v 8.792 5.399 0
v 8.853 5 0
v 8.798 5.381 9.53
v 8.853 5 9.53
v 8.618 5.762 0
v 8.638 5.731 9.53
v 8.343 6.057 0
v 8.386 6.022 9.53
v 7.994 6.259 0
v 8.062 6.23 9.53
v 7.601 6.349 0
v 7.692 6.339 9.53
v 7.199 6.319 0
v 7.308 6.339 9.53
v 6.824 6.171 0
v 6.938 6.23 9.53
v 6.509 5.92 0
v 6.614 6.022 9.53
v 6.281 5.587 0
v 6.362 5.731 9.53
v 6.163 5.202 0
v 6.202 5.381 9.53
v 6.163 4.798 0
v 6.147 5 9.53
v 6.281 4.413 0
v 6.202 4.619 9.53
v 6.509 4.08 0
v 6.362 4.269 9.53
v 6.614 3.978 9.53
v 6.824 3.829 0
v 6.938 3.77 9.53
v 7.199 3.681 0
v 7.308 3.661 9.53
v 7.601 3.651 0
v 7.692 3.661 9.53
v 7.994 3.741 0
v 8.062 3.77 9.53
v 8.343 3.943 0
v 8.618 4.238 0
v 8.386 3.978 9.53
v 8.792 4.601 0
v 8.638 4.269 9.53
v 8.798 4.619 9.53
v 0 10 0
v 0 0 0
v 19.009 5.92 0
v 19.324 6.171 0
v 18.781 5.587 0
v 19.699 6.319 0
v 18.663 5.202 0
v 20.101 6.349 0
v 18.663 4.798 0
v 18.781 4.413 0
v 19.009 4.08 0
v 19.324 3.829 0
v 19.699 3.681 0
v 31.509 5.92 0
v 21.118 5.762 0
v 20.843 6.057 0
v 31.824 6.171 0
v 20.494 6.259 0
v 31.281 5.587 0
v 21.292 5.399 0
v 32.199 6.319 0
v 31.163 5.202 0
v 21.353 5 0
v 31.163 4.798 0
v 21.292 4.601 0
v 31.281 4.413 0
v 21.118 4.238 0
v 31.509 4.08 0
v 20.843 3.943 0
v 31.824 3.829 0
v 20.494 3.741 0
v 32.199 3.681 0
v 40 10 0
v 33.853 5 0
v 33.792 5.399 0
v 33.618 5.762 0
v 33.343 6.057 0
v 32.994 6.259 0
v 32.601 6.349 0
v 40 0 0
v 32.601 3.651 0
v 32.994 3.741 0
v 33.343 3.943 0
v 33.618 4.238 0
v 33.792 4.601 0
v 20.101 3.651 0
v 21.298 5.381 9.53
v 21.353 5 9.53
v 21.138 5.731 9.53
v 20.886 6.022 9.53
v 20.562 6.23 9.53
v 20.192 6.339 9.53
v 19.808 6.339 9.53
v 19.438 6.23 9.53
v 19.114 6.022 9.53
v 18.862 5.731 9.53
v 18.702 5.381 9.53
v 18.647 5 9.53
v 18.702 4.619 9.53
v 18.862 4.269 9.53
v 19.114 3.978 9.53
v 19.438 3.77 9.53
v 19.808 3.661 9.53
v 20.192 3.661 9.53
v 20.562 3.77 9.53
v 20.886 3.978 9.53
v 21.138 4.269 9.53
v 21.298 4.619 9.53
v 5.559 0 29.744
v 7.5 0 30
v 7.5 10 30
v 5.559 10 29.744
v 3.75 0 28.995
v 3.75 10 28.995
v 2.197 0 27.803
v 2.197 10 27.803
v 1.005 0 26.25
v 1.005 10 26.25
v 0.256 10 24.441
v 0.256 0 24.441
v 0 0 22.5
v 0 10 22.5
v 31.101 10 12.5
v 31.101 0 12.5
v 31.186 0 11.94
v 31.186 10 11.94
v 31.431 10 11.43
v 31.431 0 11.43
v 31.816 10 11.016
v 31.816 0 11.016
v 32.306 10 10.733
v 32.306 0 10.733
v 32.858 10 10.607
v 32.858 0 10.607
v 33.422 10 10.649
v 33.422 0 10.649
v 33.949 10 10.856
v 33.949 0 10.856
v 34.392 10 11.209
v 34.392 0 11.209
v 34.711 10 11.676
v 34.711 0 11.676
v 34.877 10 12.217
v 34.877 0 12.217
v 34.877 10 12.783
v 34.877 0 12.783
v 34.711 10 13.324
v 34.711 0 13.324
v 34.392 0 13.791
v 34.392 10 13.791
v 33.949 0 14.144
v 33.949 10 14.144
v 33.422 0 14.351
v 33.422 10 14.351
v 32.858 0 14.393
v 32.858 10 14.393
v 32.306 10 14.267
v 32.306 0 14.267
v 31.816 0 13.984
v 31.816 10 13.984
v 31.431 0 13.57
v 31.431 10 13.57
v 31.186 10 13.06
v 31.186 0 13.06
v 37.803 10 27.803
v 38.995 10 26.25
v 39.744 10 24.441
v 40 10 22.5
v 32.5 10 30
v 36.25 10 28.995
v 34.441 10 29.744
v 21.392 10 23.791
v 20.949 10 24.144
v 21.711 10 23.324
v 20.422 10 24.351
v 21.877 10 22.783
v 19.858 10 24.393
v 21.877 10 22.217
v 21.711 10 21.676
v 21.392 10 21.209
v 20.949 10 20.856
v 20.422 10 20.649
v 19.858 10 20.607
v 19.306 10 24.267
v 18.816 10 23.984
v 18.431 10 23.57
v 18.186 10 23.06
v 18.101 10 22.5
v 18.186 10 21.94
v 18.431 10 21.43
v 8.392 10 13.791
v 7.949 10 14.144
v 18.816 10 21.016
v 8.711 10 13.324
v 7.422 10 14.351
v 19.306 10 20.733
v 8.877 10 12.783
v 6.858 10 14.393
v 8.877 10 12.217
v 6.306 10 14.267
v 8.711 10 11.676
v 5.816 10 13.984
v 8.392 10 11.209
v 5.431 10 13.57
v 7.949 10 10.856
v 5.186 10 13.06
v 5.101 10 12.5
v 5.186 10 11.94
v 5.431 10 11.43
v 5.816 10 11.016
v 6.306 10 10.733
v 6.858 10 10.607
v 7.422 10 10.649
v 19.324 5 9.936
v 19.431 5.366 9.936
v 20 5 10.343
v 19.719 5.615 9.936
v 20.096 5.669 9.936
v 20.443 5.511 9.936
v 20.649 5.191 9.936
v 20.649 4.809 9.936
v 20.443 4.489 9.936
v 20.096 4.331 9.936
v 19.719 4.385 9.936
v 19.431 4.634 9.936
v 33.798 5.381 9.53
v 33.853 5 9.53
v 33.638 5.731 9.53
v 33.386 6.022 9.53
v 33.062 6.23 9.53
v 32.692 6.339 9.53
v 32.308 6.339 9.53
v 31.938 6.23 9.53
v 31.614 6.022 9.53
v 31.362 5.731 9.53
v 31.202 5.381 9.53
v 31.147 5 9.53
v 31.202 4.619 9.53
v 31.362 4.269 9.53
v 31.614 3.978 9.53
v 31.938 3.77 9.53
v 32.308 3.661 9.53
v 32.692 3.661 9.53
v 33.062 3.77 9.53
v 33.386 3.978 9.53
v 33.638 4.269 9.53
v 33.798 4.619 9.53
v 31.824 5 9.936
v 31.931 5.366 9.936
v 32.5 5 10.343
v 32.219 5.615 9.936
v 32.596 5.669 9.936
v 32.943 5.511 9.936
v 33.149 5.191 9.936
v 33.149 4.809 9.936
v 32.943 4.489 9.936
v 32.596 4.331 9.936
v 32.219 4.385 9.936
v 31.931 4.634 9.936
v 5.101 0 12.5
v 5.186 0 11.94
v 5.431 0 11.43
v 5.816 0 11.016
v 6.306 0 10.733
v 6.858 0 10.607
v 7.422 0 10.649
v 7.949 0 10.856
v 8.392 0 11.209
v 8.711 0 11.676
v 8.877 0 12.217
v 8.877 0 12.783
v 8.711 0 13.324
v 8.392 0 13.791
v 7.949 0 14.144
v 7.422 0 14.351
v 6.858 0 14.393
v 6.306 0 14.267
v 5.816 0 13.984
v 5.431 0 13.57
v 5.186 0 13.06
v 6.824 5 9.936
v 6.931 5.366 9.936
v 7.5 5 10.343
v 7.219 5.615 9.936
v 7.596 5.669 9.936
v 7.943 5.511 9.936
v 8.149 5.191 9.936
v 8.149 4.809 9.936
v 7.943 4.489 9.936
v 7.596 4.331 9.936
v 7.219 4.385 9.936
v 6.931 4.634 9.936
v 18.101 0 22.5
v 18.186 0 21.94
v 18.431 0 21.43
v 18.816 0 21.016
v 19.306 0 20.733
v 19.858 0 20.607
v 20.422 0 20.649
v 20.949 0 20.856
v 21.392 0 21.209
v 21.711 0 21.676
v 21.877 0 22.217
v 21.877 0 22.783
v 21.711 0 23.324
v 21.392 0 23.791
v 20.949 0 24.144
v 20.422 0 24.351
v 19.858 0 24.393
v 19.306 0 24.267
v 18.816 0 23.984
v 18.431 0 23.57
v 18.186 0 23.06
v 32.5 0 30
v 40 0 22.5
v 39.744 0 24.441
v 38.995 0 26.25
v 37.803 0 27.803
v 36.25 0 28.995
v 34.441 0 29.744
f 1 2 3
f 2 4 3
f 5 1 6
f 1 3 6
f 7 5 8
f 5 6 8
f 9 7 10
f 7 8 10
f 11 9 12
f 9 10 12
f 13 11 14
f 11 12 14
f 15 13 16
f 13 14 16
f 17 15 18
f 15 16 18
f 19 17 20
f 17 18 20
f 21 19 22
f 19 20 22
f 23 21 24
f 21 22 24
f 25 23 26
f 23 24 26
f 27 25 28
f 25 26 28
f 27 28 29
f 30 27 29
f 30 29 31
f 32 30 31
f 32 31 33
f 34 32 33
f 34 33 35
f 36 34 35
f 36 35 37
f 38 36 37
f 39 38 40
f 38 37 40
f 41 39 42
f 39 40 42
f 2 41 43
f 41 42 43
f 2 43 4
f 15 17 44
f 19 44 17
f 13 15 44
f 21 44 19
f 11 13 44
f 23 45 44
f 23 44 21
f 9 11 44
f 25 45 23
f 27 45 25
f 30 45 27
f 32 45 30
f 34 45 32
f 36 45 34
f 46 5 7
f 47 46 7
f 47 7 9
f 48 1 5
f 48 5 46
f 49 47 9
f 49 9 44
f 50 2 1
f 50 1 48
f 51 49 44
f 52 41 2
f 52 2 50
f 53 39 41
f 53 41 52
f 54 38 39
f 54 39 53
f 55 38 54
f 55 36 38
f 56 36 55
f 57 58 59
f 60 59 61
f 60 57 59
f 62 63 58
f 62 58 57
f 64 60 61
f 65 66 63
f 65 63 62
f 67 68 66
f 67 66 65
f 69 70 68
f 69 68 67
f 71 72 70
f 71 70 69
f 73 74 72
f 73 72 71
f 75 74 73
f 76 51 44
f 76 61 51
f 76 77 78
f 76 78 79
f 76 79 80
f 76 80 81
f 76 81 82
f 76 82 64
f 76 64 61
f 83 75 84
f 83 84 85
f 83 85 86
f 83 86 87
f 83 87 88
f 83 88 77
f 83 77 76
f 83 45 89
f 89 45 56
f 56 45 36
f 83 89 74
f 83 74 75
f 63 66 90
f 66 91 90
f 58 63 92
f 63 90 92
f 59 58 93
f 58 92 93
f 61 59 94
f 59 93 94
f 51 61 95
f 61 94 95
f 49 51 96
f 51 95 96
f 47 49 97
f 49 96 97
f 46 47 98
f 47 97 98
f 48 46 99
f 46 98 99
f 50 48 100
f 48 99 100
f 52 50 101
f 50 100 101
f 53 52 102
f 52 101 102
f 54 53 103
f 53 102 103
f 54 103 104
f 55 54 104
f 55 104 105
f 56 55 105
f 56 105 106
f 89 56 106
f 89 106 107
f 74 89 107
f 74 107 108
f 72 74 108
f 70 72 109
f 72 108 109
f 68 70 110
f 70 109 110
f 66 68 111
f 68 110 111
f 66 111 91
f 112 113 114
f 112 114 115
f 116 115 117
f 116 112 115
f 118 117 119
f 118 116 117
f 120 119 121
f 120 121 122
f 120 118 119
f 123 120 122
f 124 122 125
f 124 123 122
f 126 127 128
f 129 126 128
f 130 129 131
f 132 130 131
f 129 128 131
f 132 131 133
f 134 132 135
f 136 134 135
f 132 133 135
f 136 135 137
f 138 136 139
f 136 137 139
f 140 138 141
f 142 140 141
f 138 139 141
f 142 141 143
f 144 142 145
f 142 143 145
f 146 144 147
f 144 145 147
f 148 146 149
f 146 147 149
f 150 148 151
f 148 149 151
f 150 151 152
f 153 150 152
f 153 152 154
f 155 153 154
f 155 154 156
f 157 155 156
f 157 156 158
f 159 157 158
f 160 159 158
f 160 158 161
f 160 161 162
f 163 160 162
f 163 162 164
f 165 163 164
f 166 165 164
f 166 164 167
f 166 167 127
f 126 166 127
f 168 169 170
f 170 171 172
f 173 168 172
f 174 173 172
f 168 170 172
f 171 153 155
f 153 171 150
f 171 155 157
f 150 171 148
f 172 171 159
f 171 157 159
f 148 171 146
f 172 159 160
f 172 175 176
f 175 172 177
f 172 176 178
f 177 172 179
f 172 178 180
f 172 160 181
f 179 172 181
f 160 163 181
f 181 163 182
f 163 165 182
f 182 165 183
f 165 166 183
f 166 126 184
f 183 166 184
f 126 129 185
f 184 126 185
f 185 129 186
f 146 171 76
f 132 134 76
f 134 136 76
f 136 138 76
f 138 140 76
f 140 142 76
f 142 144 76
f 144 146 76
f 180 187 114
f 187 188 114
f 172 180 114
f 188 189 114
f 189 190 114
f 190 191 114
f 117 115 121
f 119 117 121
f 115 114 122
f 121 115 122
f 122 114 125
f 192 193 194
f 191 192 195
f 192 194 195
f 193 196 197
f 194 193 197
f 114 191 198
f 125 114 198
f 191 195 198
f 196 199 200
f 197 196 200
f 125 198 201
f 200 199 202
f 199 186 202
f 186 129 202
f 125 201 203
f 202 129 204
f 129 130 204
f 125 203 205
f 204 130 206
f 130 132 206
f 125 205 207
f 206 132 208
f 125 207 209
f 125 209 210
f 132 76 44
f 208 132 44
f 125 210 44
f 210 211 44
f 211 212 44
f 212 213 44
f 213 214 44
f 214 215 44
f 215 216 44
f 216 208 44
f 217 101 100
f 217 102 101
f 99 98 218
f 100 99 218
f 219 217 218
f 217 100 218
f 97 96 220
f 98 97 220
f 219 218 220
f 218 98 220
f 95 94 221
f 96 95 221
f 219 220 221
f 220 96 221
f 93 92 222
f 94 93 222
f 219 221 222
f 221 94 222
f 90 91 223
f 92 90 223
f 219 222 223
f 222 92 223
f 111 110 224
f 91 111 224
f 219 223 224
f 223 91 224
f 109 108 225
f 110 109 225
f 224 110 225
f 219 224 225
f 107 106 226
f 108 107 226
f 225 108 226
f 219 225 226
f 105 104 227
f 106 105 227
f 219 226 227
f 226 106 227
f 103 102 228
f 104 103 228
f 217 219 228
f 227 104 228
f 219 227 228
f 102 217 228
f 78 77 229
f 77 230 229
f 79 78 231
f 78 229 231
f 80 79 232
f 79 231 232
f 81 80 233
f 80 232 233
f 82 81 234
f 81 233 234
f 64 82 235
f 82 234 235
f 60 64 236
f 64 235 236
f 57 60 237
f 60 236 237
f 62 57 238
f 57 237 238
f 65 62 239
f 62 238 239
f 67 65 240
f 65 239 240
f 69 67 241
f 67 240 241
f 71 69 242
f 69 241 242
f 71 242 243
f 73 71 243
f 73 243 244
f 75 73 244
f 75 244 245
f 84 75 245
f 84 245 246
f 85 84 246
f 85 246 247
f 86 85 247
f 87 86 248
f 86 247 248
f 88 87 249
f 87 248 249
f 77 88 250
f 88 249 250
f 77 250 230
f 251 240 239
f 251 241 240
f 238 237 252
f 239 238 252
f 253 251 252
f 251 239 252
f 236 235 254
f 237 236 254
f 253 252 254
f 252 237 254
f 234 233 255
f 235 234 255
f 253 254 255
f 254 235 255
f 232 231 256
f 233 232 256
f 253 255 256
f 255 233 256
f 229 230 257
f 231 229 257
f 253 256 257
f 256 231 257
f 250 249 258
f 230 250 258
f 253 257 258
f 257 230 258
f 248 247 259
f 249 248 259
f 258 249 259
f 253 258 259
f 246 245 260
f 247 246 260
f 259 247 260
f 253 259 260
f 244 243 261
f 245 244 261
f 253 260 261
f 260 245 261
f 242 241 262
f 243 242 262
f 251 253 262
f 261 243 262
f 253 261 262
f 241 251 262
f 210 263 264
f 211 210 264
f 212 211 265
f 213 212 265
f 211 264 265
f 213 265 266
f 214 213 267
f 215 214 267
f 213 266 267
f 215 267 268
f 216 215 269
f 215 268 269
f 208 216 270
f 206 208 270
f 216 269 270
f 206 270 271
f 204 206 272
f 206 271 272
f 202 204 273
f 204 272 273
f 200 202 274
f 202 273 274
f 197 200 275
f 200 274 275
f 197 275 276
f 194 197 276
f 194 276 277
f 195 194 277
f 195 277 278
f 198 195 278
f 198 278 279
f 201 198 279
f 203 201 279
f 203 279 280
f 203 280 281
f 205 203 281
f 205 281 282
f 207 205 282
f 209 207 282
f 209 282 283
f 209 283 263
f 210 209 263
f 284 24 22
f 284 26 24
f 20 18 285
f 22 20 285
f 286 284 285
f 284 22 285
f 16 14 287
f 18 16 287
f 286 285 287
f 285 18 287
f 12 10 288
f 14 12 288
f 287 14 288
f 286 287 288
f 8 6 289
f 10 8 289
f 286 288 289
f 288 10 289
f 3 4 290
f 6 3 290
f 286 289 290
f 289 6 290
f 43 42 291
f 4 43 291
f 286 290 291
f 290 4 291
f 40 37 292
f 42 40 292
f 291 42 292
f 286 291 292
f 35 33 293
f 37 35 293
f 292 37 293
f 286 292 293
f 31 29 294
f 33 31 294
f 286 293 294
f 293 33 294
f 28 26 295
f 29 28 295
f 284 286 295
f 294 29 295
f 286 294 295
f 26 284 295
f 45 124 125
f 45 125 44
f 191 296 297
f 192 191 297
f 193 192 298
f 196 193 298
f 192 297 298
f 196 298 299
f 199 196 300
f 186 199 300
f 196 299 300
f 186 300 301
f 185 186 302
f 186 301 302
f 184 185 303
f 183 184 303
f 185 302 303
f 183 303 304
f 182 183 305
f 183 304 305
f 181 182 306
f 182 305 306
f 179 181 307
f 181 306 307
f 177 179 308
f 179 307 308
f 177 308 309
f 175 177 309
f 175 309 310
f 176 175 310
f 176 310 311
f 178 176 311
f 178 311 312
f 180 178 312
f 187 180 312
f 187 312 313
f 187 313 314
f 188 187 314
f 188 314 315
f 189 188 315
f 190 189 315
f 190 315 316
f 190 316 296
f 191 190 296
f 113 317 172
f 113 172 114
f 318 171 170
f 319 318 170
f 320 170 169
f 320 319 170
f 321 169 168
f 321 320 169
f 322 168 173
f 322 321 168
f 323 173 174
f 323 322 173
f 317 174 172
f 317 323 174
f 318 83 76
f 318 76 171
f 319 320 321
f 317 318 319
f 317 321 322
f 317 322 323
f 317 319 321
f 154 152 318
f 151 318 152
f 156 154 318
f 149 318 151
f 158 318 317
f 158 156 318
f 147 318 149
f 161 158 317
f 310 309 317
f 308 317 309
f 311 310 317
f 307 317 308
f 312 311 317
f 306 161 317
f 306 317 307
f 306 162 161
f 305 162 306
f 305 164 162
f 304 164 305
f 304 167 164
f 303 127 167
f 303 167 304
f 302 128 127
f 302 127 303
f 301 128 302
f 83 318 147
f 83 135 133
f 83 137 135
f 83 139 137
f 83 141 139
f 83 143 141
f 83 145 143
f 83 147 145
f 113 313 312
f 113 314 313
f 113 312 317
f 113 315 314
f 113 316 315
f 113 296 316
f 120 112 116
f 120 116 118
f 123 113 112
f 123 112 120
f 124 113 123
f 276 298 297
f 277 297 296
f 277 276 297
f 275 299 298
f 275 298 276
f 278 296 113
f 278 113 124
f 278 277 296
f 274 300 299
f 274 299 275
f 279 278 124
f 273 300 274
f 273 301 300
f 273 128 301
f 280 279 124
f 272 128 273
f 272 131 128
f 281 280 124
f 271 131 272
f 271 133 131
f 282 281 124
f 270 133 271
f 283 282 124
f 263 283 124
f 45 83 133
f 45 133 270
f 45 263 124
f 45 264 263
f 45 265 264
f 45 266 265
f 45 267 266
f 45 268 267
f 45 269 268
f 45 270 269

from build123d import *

# Parameters (mm, degrees)
BOSS_EXTRUDE1_DEPTH       = 10
F_6_CLEARANCE_HOLE1_D     = 3.7973
F_6_32_TAPPED_HOLE1_D     = 2.7051
F_6_32_TAPPED_HOLE1_DEPTH = 9.53
F_6_32_TAPPED_HOLE1_TIP   = 0.81269403


with BuildPart() as part:
    # Sketch1 → Boss-Extrude1 (new body)
    with BuildSketch(Plane(origin=(0, 0, 0), x_dir=(1, 0, 0), z_dir=(0, 1, 0))):
        with BuildLine():
            Line((0, 0), (40, 0))
            Line((40, 0), (40, -22.5))
            ThreePointArc((40, -22.5), (37.803300859, -27.803300859), (32.5, -30))
            Line((32.5, -30), (7.5, -30))
            ThreePointArc((7.5, -30), (2.196699141, -27.803300859), (0, -22.5))
            Line((0, -22.5), (0, 0))
        make_face()
    extrude(amount=BOSS_EXTRUDE1_DEPTH)

    # #6 Clearance Hole1 (through all)
    with Locations(Plane(origin=(0, 10, 0), x_dir=(1, 0, 0), z_dir=(0, 1, 0))):
        with Locations((7, -12.5), (33, -12.5), (20, -22.5)):
            Hole(F_6_CLEARANCE_HOLE1_D / 2)

    # #6-32 Tapped Hole1
    with Locations(Plane(origin=(0, 0, 0), x_dir=(-1, 0, 0), z_dir=(0, 0, -1))):
        with Locations((-32.5, 5), (-20, 5), (-7.5, 5)):
            Hole(F_6_32_TAPPED_HOLE1_D / 2, depth=F_6_32_TAPPED_HOLE1_DEPTH)
            with Locations((0, 0, -(F_6_32_TAPPED_HOLE1_DEPTH + F_6_32_TAPPED_HOLE1_TIP / 2))):  # 118° drill point
                Cone(0, F_6_32_TAPPED_HOLE1_D / 2, F_6_32_TAPPED_HOLE1_TIP, mode=Mode.SUBTRACT)


solid = part.part
